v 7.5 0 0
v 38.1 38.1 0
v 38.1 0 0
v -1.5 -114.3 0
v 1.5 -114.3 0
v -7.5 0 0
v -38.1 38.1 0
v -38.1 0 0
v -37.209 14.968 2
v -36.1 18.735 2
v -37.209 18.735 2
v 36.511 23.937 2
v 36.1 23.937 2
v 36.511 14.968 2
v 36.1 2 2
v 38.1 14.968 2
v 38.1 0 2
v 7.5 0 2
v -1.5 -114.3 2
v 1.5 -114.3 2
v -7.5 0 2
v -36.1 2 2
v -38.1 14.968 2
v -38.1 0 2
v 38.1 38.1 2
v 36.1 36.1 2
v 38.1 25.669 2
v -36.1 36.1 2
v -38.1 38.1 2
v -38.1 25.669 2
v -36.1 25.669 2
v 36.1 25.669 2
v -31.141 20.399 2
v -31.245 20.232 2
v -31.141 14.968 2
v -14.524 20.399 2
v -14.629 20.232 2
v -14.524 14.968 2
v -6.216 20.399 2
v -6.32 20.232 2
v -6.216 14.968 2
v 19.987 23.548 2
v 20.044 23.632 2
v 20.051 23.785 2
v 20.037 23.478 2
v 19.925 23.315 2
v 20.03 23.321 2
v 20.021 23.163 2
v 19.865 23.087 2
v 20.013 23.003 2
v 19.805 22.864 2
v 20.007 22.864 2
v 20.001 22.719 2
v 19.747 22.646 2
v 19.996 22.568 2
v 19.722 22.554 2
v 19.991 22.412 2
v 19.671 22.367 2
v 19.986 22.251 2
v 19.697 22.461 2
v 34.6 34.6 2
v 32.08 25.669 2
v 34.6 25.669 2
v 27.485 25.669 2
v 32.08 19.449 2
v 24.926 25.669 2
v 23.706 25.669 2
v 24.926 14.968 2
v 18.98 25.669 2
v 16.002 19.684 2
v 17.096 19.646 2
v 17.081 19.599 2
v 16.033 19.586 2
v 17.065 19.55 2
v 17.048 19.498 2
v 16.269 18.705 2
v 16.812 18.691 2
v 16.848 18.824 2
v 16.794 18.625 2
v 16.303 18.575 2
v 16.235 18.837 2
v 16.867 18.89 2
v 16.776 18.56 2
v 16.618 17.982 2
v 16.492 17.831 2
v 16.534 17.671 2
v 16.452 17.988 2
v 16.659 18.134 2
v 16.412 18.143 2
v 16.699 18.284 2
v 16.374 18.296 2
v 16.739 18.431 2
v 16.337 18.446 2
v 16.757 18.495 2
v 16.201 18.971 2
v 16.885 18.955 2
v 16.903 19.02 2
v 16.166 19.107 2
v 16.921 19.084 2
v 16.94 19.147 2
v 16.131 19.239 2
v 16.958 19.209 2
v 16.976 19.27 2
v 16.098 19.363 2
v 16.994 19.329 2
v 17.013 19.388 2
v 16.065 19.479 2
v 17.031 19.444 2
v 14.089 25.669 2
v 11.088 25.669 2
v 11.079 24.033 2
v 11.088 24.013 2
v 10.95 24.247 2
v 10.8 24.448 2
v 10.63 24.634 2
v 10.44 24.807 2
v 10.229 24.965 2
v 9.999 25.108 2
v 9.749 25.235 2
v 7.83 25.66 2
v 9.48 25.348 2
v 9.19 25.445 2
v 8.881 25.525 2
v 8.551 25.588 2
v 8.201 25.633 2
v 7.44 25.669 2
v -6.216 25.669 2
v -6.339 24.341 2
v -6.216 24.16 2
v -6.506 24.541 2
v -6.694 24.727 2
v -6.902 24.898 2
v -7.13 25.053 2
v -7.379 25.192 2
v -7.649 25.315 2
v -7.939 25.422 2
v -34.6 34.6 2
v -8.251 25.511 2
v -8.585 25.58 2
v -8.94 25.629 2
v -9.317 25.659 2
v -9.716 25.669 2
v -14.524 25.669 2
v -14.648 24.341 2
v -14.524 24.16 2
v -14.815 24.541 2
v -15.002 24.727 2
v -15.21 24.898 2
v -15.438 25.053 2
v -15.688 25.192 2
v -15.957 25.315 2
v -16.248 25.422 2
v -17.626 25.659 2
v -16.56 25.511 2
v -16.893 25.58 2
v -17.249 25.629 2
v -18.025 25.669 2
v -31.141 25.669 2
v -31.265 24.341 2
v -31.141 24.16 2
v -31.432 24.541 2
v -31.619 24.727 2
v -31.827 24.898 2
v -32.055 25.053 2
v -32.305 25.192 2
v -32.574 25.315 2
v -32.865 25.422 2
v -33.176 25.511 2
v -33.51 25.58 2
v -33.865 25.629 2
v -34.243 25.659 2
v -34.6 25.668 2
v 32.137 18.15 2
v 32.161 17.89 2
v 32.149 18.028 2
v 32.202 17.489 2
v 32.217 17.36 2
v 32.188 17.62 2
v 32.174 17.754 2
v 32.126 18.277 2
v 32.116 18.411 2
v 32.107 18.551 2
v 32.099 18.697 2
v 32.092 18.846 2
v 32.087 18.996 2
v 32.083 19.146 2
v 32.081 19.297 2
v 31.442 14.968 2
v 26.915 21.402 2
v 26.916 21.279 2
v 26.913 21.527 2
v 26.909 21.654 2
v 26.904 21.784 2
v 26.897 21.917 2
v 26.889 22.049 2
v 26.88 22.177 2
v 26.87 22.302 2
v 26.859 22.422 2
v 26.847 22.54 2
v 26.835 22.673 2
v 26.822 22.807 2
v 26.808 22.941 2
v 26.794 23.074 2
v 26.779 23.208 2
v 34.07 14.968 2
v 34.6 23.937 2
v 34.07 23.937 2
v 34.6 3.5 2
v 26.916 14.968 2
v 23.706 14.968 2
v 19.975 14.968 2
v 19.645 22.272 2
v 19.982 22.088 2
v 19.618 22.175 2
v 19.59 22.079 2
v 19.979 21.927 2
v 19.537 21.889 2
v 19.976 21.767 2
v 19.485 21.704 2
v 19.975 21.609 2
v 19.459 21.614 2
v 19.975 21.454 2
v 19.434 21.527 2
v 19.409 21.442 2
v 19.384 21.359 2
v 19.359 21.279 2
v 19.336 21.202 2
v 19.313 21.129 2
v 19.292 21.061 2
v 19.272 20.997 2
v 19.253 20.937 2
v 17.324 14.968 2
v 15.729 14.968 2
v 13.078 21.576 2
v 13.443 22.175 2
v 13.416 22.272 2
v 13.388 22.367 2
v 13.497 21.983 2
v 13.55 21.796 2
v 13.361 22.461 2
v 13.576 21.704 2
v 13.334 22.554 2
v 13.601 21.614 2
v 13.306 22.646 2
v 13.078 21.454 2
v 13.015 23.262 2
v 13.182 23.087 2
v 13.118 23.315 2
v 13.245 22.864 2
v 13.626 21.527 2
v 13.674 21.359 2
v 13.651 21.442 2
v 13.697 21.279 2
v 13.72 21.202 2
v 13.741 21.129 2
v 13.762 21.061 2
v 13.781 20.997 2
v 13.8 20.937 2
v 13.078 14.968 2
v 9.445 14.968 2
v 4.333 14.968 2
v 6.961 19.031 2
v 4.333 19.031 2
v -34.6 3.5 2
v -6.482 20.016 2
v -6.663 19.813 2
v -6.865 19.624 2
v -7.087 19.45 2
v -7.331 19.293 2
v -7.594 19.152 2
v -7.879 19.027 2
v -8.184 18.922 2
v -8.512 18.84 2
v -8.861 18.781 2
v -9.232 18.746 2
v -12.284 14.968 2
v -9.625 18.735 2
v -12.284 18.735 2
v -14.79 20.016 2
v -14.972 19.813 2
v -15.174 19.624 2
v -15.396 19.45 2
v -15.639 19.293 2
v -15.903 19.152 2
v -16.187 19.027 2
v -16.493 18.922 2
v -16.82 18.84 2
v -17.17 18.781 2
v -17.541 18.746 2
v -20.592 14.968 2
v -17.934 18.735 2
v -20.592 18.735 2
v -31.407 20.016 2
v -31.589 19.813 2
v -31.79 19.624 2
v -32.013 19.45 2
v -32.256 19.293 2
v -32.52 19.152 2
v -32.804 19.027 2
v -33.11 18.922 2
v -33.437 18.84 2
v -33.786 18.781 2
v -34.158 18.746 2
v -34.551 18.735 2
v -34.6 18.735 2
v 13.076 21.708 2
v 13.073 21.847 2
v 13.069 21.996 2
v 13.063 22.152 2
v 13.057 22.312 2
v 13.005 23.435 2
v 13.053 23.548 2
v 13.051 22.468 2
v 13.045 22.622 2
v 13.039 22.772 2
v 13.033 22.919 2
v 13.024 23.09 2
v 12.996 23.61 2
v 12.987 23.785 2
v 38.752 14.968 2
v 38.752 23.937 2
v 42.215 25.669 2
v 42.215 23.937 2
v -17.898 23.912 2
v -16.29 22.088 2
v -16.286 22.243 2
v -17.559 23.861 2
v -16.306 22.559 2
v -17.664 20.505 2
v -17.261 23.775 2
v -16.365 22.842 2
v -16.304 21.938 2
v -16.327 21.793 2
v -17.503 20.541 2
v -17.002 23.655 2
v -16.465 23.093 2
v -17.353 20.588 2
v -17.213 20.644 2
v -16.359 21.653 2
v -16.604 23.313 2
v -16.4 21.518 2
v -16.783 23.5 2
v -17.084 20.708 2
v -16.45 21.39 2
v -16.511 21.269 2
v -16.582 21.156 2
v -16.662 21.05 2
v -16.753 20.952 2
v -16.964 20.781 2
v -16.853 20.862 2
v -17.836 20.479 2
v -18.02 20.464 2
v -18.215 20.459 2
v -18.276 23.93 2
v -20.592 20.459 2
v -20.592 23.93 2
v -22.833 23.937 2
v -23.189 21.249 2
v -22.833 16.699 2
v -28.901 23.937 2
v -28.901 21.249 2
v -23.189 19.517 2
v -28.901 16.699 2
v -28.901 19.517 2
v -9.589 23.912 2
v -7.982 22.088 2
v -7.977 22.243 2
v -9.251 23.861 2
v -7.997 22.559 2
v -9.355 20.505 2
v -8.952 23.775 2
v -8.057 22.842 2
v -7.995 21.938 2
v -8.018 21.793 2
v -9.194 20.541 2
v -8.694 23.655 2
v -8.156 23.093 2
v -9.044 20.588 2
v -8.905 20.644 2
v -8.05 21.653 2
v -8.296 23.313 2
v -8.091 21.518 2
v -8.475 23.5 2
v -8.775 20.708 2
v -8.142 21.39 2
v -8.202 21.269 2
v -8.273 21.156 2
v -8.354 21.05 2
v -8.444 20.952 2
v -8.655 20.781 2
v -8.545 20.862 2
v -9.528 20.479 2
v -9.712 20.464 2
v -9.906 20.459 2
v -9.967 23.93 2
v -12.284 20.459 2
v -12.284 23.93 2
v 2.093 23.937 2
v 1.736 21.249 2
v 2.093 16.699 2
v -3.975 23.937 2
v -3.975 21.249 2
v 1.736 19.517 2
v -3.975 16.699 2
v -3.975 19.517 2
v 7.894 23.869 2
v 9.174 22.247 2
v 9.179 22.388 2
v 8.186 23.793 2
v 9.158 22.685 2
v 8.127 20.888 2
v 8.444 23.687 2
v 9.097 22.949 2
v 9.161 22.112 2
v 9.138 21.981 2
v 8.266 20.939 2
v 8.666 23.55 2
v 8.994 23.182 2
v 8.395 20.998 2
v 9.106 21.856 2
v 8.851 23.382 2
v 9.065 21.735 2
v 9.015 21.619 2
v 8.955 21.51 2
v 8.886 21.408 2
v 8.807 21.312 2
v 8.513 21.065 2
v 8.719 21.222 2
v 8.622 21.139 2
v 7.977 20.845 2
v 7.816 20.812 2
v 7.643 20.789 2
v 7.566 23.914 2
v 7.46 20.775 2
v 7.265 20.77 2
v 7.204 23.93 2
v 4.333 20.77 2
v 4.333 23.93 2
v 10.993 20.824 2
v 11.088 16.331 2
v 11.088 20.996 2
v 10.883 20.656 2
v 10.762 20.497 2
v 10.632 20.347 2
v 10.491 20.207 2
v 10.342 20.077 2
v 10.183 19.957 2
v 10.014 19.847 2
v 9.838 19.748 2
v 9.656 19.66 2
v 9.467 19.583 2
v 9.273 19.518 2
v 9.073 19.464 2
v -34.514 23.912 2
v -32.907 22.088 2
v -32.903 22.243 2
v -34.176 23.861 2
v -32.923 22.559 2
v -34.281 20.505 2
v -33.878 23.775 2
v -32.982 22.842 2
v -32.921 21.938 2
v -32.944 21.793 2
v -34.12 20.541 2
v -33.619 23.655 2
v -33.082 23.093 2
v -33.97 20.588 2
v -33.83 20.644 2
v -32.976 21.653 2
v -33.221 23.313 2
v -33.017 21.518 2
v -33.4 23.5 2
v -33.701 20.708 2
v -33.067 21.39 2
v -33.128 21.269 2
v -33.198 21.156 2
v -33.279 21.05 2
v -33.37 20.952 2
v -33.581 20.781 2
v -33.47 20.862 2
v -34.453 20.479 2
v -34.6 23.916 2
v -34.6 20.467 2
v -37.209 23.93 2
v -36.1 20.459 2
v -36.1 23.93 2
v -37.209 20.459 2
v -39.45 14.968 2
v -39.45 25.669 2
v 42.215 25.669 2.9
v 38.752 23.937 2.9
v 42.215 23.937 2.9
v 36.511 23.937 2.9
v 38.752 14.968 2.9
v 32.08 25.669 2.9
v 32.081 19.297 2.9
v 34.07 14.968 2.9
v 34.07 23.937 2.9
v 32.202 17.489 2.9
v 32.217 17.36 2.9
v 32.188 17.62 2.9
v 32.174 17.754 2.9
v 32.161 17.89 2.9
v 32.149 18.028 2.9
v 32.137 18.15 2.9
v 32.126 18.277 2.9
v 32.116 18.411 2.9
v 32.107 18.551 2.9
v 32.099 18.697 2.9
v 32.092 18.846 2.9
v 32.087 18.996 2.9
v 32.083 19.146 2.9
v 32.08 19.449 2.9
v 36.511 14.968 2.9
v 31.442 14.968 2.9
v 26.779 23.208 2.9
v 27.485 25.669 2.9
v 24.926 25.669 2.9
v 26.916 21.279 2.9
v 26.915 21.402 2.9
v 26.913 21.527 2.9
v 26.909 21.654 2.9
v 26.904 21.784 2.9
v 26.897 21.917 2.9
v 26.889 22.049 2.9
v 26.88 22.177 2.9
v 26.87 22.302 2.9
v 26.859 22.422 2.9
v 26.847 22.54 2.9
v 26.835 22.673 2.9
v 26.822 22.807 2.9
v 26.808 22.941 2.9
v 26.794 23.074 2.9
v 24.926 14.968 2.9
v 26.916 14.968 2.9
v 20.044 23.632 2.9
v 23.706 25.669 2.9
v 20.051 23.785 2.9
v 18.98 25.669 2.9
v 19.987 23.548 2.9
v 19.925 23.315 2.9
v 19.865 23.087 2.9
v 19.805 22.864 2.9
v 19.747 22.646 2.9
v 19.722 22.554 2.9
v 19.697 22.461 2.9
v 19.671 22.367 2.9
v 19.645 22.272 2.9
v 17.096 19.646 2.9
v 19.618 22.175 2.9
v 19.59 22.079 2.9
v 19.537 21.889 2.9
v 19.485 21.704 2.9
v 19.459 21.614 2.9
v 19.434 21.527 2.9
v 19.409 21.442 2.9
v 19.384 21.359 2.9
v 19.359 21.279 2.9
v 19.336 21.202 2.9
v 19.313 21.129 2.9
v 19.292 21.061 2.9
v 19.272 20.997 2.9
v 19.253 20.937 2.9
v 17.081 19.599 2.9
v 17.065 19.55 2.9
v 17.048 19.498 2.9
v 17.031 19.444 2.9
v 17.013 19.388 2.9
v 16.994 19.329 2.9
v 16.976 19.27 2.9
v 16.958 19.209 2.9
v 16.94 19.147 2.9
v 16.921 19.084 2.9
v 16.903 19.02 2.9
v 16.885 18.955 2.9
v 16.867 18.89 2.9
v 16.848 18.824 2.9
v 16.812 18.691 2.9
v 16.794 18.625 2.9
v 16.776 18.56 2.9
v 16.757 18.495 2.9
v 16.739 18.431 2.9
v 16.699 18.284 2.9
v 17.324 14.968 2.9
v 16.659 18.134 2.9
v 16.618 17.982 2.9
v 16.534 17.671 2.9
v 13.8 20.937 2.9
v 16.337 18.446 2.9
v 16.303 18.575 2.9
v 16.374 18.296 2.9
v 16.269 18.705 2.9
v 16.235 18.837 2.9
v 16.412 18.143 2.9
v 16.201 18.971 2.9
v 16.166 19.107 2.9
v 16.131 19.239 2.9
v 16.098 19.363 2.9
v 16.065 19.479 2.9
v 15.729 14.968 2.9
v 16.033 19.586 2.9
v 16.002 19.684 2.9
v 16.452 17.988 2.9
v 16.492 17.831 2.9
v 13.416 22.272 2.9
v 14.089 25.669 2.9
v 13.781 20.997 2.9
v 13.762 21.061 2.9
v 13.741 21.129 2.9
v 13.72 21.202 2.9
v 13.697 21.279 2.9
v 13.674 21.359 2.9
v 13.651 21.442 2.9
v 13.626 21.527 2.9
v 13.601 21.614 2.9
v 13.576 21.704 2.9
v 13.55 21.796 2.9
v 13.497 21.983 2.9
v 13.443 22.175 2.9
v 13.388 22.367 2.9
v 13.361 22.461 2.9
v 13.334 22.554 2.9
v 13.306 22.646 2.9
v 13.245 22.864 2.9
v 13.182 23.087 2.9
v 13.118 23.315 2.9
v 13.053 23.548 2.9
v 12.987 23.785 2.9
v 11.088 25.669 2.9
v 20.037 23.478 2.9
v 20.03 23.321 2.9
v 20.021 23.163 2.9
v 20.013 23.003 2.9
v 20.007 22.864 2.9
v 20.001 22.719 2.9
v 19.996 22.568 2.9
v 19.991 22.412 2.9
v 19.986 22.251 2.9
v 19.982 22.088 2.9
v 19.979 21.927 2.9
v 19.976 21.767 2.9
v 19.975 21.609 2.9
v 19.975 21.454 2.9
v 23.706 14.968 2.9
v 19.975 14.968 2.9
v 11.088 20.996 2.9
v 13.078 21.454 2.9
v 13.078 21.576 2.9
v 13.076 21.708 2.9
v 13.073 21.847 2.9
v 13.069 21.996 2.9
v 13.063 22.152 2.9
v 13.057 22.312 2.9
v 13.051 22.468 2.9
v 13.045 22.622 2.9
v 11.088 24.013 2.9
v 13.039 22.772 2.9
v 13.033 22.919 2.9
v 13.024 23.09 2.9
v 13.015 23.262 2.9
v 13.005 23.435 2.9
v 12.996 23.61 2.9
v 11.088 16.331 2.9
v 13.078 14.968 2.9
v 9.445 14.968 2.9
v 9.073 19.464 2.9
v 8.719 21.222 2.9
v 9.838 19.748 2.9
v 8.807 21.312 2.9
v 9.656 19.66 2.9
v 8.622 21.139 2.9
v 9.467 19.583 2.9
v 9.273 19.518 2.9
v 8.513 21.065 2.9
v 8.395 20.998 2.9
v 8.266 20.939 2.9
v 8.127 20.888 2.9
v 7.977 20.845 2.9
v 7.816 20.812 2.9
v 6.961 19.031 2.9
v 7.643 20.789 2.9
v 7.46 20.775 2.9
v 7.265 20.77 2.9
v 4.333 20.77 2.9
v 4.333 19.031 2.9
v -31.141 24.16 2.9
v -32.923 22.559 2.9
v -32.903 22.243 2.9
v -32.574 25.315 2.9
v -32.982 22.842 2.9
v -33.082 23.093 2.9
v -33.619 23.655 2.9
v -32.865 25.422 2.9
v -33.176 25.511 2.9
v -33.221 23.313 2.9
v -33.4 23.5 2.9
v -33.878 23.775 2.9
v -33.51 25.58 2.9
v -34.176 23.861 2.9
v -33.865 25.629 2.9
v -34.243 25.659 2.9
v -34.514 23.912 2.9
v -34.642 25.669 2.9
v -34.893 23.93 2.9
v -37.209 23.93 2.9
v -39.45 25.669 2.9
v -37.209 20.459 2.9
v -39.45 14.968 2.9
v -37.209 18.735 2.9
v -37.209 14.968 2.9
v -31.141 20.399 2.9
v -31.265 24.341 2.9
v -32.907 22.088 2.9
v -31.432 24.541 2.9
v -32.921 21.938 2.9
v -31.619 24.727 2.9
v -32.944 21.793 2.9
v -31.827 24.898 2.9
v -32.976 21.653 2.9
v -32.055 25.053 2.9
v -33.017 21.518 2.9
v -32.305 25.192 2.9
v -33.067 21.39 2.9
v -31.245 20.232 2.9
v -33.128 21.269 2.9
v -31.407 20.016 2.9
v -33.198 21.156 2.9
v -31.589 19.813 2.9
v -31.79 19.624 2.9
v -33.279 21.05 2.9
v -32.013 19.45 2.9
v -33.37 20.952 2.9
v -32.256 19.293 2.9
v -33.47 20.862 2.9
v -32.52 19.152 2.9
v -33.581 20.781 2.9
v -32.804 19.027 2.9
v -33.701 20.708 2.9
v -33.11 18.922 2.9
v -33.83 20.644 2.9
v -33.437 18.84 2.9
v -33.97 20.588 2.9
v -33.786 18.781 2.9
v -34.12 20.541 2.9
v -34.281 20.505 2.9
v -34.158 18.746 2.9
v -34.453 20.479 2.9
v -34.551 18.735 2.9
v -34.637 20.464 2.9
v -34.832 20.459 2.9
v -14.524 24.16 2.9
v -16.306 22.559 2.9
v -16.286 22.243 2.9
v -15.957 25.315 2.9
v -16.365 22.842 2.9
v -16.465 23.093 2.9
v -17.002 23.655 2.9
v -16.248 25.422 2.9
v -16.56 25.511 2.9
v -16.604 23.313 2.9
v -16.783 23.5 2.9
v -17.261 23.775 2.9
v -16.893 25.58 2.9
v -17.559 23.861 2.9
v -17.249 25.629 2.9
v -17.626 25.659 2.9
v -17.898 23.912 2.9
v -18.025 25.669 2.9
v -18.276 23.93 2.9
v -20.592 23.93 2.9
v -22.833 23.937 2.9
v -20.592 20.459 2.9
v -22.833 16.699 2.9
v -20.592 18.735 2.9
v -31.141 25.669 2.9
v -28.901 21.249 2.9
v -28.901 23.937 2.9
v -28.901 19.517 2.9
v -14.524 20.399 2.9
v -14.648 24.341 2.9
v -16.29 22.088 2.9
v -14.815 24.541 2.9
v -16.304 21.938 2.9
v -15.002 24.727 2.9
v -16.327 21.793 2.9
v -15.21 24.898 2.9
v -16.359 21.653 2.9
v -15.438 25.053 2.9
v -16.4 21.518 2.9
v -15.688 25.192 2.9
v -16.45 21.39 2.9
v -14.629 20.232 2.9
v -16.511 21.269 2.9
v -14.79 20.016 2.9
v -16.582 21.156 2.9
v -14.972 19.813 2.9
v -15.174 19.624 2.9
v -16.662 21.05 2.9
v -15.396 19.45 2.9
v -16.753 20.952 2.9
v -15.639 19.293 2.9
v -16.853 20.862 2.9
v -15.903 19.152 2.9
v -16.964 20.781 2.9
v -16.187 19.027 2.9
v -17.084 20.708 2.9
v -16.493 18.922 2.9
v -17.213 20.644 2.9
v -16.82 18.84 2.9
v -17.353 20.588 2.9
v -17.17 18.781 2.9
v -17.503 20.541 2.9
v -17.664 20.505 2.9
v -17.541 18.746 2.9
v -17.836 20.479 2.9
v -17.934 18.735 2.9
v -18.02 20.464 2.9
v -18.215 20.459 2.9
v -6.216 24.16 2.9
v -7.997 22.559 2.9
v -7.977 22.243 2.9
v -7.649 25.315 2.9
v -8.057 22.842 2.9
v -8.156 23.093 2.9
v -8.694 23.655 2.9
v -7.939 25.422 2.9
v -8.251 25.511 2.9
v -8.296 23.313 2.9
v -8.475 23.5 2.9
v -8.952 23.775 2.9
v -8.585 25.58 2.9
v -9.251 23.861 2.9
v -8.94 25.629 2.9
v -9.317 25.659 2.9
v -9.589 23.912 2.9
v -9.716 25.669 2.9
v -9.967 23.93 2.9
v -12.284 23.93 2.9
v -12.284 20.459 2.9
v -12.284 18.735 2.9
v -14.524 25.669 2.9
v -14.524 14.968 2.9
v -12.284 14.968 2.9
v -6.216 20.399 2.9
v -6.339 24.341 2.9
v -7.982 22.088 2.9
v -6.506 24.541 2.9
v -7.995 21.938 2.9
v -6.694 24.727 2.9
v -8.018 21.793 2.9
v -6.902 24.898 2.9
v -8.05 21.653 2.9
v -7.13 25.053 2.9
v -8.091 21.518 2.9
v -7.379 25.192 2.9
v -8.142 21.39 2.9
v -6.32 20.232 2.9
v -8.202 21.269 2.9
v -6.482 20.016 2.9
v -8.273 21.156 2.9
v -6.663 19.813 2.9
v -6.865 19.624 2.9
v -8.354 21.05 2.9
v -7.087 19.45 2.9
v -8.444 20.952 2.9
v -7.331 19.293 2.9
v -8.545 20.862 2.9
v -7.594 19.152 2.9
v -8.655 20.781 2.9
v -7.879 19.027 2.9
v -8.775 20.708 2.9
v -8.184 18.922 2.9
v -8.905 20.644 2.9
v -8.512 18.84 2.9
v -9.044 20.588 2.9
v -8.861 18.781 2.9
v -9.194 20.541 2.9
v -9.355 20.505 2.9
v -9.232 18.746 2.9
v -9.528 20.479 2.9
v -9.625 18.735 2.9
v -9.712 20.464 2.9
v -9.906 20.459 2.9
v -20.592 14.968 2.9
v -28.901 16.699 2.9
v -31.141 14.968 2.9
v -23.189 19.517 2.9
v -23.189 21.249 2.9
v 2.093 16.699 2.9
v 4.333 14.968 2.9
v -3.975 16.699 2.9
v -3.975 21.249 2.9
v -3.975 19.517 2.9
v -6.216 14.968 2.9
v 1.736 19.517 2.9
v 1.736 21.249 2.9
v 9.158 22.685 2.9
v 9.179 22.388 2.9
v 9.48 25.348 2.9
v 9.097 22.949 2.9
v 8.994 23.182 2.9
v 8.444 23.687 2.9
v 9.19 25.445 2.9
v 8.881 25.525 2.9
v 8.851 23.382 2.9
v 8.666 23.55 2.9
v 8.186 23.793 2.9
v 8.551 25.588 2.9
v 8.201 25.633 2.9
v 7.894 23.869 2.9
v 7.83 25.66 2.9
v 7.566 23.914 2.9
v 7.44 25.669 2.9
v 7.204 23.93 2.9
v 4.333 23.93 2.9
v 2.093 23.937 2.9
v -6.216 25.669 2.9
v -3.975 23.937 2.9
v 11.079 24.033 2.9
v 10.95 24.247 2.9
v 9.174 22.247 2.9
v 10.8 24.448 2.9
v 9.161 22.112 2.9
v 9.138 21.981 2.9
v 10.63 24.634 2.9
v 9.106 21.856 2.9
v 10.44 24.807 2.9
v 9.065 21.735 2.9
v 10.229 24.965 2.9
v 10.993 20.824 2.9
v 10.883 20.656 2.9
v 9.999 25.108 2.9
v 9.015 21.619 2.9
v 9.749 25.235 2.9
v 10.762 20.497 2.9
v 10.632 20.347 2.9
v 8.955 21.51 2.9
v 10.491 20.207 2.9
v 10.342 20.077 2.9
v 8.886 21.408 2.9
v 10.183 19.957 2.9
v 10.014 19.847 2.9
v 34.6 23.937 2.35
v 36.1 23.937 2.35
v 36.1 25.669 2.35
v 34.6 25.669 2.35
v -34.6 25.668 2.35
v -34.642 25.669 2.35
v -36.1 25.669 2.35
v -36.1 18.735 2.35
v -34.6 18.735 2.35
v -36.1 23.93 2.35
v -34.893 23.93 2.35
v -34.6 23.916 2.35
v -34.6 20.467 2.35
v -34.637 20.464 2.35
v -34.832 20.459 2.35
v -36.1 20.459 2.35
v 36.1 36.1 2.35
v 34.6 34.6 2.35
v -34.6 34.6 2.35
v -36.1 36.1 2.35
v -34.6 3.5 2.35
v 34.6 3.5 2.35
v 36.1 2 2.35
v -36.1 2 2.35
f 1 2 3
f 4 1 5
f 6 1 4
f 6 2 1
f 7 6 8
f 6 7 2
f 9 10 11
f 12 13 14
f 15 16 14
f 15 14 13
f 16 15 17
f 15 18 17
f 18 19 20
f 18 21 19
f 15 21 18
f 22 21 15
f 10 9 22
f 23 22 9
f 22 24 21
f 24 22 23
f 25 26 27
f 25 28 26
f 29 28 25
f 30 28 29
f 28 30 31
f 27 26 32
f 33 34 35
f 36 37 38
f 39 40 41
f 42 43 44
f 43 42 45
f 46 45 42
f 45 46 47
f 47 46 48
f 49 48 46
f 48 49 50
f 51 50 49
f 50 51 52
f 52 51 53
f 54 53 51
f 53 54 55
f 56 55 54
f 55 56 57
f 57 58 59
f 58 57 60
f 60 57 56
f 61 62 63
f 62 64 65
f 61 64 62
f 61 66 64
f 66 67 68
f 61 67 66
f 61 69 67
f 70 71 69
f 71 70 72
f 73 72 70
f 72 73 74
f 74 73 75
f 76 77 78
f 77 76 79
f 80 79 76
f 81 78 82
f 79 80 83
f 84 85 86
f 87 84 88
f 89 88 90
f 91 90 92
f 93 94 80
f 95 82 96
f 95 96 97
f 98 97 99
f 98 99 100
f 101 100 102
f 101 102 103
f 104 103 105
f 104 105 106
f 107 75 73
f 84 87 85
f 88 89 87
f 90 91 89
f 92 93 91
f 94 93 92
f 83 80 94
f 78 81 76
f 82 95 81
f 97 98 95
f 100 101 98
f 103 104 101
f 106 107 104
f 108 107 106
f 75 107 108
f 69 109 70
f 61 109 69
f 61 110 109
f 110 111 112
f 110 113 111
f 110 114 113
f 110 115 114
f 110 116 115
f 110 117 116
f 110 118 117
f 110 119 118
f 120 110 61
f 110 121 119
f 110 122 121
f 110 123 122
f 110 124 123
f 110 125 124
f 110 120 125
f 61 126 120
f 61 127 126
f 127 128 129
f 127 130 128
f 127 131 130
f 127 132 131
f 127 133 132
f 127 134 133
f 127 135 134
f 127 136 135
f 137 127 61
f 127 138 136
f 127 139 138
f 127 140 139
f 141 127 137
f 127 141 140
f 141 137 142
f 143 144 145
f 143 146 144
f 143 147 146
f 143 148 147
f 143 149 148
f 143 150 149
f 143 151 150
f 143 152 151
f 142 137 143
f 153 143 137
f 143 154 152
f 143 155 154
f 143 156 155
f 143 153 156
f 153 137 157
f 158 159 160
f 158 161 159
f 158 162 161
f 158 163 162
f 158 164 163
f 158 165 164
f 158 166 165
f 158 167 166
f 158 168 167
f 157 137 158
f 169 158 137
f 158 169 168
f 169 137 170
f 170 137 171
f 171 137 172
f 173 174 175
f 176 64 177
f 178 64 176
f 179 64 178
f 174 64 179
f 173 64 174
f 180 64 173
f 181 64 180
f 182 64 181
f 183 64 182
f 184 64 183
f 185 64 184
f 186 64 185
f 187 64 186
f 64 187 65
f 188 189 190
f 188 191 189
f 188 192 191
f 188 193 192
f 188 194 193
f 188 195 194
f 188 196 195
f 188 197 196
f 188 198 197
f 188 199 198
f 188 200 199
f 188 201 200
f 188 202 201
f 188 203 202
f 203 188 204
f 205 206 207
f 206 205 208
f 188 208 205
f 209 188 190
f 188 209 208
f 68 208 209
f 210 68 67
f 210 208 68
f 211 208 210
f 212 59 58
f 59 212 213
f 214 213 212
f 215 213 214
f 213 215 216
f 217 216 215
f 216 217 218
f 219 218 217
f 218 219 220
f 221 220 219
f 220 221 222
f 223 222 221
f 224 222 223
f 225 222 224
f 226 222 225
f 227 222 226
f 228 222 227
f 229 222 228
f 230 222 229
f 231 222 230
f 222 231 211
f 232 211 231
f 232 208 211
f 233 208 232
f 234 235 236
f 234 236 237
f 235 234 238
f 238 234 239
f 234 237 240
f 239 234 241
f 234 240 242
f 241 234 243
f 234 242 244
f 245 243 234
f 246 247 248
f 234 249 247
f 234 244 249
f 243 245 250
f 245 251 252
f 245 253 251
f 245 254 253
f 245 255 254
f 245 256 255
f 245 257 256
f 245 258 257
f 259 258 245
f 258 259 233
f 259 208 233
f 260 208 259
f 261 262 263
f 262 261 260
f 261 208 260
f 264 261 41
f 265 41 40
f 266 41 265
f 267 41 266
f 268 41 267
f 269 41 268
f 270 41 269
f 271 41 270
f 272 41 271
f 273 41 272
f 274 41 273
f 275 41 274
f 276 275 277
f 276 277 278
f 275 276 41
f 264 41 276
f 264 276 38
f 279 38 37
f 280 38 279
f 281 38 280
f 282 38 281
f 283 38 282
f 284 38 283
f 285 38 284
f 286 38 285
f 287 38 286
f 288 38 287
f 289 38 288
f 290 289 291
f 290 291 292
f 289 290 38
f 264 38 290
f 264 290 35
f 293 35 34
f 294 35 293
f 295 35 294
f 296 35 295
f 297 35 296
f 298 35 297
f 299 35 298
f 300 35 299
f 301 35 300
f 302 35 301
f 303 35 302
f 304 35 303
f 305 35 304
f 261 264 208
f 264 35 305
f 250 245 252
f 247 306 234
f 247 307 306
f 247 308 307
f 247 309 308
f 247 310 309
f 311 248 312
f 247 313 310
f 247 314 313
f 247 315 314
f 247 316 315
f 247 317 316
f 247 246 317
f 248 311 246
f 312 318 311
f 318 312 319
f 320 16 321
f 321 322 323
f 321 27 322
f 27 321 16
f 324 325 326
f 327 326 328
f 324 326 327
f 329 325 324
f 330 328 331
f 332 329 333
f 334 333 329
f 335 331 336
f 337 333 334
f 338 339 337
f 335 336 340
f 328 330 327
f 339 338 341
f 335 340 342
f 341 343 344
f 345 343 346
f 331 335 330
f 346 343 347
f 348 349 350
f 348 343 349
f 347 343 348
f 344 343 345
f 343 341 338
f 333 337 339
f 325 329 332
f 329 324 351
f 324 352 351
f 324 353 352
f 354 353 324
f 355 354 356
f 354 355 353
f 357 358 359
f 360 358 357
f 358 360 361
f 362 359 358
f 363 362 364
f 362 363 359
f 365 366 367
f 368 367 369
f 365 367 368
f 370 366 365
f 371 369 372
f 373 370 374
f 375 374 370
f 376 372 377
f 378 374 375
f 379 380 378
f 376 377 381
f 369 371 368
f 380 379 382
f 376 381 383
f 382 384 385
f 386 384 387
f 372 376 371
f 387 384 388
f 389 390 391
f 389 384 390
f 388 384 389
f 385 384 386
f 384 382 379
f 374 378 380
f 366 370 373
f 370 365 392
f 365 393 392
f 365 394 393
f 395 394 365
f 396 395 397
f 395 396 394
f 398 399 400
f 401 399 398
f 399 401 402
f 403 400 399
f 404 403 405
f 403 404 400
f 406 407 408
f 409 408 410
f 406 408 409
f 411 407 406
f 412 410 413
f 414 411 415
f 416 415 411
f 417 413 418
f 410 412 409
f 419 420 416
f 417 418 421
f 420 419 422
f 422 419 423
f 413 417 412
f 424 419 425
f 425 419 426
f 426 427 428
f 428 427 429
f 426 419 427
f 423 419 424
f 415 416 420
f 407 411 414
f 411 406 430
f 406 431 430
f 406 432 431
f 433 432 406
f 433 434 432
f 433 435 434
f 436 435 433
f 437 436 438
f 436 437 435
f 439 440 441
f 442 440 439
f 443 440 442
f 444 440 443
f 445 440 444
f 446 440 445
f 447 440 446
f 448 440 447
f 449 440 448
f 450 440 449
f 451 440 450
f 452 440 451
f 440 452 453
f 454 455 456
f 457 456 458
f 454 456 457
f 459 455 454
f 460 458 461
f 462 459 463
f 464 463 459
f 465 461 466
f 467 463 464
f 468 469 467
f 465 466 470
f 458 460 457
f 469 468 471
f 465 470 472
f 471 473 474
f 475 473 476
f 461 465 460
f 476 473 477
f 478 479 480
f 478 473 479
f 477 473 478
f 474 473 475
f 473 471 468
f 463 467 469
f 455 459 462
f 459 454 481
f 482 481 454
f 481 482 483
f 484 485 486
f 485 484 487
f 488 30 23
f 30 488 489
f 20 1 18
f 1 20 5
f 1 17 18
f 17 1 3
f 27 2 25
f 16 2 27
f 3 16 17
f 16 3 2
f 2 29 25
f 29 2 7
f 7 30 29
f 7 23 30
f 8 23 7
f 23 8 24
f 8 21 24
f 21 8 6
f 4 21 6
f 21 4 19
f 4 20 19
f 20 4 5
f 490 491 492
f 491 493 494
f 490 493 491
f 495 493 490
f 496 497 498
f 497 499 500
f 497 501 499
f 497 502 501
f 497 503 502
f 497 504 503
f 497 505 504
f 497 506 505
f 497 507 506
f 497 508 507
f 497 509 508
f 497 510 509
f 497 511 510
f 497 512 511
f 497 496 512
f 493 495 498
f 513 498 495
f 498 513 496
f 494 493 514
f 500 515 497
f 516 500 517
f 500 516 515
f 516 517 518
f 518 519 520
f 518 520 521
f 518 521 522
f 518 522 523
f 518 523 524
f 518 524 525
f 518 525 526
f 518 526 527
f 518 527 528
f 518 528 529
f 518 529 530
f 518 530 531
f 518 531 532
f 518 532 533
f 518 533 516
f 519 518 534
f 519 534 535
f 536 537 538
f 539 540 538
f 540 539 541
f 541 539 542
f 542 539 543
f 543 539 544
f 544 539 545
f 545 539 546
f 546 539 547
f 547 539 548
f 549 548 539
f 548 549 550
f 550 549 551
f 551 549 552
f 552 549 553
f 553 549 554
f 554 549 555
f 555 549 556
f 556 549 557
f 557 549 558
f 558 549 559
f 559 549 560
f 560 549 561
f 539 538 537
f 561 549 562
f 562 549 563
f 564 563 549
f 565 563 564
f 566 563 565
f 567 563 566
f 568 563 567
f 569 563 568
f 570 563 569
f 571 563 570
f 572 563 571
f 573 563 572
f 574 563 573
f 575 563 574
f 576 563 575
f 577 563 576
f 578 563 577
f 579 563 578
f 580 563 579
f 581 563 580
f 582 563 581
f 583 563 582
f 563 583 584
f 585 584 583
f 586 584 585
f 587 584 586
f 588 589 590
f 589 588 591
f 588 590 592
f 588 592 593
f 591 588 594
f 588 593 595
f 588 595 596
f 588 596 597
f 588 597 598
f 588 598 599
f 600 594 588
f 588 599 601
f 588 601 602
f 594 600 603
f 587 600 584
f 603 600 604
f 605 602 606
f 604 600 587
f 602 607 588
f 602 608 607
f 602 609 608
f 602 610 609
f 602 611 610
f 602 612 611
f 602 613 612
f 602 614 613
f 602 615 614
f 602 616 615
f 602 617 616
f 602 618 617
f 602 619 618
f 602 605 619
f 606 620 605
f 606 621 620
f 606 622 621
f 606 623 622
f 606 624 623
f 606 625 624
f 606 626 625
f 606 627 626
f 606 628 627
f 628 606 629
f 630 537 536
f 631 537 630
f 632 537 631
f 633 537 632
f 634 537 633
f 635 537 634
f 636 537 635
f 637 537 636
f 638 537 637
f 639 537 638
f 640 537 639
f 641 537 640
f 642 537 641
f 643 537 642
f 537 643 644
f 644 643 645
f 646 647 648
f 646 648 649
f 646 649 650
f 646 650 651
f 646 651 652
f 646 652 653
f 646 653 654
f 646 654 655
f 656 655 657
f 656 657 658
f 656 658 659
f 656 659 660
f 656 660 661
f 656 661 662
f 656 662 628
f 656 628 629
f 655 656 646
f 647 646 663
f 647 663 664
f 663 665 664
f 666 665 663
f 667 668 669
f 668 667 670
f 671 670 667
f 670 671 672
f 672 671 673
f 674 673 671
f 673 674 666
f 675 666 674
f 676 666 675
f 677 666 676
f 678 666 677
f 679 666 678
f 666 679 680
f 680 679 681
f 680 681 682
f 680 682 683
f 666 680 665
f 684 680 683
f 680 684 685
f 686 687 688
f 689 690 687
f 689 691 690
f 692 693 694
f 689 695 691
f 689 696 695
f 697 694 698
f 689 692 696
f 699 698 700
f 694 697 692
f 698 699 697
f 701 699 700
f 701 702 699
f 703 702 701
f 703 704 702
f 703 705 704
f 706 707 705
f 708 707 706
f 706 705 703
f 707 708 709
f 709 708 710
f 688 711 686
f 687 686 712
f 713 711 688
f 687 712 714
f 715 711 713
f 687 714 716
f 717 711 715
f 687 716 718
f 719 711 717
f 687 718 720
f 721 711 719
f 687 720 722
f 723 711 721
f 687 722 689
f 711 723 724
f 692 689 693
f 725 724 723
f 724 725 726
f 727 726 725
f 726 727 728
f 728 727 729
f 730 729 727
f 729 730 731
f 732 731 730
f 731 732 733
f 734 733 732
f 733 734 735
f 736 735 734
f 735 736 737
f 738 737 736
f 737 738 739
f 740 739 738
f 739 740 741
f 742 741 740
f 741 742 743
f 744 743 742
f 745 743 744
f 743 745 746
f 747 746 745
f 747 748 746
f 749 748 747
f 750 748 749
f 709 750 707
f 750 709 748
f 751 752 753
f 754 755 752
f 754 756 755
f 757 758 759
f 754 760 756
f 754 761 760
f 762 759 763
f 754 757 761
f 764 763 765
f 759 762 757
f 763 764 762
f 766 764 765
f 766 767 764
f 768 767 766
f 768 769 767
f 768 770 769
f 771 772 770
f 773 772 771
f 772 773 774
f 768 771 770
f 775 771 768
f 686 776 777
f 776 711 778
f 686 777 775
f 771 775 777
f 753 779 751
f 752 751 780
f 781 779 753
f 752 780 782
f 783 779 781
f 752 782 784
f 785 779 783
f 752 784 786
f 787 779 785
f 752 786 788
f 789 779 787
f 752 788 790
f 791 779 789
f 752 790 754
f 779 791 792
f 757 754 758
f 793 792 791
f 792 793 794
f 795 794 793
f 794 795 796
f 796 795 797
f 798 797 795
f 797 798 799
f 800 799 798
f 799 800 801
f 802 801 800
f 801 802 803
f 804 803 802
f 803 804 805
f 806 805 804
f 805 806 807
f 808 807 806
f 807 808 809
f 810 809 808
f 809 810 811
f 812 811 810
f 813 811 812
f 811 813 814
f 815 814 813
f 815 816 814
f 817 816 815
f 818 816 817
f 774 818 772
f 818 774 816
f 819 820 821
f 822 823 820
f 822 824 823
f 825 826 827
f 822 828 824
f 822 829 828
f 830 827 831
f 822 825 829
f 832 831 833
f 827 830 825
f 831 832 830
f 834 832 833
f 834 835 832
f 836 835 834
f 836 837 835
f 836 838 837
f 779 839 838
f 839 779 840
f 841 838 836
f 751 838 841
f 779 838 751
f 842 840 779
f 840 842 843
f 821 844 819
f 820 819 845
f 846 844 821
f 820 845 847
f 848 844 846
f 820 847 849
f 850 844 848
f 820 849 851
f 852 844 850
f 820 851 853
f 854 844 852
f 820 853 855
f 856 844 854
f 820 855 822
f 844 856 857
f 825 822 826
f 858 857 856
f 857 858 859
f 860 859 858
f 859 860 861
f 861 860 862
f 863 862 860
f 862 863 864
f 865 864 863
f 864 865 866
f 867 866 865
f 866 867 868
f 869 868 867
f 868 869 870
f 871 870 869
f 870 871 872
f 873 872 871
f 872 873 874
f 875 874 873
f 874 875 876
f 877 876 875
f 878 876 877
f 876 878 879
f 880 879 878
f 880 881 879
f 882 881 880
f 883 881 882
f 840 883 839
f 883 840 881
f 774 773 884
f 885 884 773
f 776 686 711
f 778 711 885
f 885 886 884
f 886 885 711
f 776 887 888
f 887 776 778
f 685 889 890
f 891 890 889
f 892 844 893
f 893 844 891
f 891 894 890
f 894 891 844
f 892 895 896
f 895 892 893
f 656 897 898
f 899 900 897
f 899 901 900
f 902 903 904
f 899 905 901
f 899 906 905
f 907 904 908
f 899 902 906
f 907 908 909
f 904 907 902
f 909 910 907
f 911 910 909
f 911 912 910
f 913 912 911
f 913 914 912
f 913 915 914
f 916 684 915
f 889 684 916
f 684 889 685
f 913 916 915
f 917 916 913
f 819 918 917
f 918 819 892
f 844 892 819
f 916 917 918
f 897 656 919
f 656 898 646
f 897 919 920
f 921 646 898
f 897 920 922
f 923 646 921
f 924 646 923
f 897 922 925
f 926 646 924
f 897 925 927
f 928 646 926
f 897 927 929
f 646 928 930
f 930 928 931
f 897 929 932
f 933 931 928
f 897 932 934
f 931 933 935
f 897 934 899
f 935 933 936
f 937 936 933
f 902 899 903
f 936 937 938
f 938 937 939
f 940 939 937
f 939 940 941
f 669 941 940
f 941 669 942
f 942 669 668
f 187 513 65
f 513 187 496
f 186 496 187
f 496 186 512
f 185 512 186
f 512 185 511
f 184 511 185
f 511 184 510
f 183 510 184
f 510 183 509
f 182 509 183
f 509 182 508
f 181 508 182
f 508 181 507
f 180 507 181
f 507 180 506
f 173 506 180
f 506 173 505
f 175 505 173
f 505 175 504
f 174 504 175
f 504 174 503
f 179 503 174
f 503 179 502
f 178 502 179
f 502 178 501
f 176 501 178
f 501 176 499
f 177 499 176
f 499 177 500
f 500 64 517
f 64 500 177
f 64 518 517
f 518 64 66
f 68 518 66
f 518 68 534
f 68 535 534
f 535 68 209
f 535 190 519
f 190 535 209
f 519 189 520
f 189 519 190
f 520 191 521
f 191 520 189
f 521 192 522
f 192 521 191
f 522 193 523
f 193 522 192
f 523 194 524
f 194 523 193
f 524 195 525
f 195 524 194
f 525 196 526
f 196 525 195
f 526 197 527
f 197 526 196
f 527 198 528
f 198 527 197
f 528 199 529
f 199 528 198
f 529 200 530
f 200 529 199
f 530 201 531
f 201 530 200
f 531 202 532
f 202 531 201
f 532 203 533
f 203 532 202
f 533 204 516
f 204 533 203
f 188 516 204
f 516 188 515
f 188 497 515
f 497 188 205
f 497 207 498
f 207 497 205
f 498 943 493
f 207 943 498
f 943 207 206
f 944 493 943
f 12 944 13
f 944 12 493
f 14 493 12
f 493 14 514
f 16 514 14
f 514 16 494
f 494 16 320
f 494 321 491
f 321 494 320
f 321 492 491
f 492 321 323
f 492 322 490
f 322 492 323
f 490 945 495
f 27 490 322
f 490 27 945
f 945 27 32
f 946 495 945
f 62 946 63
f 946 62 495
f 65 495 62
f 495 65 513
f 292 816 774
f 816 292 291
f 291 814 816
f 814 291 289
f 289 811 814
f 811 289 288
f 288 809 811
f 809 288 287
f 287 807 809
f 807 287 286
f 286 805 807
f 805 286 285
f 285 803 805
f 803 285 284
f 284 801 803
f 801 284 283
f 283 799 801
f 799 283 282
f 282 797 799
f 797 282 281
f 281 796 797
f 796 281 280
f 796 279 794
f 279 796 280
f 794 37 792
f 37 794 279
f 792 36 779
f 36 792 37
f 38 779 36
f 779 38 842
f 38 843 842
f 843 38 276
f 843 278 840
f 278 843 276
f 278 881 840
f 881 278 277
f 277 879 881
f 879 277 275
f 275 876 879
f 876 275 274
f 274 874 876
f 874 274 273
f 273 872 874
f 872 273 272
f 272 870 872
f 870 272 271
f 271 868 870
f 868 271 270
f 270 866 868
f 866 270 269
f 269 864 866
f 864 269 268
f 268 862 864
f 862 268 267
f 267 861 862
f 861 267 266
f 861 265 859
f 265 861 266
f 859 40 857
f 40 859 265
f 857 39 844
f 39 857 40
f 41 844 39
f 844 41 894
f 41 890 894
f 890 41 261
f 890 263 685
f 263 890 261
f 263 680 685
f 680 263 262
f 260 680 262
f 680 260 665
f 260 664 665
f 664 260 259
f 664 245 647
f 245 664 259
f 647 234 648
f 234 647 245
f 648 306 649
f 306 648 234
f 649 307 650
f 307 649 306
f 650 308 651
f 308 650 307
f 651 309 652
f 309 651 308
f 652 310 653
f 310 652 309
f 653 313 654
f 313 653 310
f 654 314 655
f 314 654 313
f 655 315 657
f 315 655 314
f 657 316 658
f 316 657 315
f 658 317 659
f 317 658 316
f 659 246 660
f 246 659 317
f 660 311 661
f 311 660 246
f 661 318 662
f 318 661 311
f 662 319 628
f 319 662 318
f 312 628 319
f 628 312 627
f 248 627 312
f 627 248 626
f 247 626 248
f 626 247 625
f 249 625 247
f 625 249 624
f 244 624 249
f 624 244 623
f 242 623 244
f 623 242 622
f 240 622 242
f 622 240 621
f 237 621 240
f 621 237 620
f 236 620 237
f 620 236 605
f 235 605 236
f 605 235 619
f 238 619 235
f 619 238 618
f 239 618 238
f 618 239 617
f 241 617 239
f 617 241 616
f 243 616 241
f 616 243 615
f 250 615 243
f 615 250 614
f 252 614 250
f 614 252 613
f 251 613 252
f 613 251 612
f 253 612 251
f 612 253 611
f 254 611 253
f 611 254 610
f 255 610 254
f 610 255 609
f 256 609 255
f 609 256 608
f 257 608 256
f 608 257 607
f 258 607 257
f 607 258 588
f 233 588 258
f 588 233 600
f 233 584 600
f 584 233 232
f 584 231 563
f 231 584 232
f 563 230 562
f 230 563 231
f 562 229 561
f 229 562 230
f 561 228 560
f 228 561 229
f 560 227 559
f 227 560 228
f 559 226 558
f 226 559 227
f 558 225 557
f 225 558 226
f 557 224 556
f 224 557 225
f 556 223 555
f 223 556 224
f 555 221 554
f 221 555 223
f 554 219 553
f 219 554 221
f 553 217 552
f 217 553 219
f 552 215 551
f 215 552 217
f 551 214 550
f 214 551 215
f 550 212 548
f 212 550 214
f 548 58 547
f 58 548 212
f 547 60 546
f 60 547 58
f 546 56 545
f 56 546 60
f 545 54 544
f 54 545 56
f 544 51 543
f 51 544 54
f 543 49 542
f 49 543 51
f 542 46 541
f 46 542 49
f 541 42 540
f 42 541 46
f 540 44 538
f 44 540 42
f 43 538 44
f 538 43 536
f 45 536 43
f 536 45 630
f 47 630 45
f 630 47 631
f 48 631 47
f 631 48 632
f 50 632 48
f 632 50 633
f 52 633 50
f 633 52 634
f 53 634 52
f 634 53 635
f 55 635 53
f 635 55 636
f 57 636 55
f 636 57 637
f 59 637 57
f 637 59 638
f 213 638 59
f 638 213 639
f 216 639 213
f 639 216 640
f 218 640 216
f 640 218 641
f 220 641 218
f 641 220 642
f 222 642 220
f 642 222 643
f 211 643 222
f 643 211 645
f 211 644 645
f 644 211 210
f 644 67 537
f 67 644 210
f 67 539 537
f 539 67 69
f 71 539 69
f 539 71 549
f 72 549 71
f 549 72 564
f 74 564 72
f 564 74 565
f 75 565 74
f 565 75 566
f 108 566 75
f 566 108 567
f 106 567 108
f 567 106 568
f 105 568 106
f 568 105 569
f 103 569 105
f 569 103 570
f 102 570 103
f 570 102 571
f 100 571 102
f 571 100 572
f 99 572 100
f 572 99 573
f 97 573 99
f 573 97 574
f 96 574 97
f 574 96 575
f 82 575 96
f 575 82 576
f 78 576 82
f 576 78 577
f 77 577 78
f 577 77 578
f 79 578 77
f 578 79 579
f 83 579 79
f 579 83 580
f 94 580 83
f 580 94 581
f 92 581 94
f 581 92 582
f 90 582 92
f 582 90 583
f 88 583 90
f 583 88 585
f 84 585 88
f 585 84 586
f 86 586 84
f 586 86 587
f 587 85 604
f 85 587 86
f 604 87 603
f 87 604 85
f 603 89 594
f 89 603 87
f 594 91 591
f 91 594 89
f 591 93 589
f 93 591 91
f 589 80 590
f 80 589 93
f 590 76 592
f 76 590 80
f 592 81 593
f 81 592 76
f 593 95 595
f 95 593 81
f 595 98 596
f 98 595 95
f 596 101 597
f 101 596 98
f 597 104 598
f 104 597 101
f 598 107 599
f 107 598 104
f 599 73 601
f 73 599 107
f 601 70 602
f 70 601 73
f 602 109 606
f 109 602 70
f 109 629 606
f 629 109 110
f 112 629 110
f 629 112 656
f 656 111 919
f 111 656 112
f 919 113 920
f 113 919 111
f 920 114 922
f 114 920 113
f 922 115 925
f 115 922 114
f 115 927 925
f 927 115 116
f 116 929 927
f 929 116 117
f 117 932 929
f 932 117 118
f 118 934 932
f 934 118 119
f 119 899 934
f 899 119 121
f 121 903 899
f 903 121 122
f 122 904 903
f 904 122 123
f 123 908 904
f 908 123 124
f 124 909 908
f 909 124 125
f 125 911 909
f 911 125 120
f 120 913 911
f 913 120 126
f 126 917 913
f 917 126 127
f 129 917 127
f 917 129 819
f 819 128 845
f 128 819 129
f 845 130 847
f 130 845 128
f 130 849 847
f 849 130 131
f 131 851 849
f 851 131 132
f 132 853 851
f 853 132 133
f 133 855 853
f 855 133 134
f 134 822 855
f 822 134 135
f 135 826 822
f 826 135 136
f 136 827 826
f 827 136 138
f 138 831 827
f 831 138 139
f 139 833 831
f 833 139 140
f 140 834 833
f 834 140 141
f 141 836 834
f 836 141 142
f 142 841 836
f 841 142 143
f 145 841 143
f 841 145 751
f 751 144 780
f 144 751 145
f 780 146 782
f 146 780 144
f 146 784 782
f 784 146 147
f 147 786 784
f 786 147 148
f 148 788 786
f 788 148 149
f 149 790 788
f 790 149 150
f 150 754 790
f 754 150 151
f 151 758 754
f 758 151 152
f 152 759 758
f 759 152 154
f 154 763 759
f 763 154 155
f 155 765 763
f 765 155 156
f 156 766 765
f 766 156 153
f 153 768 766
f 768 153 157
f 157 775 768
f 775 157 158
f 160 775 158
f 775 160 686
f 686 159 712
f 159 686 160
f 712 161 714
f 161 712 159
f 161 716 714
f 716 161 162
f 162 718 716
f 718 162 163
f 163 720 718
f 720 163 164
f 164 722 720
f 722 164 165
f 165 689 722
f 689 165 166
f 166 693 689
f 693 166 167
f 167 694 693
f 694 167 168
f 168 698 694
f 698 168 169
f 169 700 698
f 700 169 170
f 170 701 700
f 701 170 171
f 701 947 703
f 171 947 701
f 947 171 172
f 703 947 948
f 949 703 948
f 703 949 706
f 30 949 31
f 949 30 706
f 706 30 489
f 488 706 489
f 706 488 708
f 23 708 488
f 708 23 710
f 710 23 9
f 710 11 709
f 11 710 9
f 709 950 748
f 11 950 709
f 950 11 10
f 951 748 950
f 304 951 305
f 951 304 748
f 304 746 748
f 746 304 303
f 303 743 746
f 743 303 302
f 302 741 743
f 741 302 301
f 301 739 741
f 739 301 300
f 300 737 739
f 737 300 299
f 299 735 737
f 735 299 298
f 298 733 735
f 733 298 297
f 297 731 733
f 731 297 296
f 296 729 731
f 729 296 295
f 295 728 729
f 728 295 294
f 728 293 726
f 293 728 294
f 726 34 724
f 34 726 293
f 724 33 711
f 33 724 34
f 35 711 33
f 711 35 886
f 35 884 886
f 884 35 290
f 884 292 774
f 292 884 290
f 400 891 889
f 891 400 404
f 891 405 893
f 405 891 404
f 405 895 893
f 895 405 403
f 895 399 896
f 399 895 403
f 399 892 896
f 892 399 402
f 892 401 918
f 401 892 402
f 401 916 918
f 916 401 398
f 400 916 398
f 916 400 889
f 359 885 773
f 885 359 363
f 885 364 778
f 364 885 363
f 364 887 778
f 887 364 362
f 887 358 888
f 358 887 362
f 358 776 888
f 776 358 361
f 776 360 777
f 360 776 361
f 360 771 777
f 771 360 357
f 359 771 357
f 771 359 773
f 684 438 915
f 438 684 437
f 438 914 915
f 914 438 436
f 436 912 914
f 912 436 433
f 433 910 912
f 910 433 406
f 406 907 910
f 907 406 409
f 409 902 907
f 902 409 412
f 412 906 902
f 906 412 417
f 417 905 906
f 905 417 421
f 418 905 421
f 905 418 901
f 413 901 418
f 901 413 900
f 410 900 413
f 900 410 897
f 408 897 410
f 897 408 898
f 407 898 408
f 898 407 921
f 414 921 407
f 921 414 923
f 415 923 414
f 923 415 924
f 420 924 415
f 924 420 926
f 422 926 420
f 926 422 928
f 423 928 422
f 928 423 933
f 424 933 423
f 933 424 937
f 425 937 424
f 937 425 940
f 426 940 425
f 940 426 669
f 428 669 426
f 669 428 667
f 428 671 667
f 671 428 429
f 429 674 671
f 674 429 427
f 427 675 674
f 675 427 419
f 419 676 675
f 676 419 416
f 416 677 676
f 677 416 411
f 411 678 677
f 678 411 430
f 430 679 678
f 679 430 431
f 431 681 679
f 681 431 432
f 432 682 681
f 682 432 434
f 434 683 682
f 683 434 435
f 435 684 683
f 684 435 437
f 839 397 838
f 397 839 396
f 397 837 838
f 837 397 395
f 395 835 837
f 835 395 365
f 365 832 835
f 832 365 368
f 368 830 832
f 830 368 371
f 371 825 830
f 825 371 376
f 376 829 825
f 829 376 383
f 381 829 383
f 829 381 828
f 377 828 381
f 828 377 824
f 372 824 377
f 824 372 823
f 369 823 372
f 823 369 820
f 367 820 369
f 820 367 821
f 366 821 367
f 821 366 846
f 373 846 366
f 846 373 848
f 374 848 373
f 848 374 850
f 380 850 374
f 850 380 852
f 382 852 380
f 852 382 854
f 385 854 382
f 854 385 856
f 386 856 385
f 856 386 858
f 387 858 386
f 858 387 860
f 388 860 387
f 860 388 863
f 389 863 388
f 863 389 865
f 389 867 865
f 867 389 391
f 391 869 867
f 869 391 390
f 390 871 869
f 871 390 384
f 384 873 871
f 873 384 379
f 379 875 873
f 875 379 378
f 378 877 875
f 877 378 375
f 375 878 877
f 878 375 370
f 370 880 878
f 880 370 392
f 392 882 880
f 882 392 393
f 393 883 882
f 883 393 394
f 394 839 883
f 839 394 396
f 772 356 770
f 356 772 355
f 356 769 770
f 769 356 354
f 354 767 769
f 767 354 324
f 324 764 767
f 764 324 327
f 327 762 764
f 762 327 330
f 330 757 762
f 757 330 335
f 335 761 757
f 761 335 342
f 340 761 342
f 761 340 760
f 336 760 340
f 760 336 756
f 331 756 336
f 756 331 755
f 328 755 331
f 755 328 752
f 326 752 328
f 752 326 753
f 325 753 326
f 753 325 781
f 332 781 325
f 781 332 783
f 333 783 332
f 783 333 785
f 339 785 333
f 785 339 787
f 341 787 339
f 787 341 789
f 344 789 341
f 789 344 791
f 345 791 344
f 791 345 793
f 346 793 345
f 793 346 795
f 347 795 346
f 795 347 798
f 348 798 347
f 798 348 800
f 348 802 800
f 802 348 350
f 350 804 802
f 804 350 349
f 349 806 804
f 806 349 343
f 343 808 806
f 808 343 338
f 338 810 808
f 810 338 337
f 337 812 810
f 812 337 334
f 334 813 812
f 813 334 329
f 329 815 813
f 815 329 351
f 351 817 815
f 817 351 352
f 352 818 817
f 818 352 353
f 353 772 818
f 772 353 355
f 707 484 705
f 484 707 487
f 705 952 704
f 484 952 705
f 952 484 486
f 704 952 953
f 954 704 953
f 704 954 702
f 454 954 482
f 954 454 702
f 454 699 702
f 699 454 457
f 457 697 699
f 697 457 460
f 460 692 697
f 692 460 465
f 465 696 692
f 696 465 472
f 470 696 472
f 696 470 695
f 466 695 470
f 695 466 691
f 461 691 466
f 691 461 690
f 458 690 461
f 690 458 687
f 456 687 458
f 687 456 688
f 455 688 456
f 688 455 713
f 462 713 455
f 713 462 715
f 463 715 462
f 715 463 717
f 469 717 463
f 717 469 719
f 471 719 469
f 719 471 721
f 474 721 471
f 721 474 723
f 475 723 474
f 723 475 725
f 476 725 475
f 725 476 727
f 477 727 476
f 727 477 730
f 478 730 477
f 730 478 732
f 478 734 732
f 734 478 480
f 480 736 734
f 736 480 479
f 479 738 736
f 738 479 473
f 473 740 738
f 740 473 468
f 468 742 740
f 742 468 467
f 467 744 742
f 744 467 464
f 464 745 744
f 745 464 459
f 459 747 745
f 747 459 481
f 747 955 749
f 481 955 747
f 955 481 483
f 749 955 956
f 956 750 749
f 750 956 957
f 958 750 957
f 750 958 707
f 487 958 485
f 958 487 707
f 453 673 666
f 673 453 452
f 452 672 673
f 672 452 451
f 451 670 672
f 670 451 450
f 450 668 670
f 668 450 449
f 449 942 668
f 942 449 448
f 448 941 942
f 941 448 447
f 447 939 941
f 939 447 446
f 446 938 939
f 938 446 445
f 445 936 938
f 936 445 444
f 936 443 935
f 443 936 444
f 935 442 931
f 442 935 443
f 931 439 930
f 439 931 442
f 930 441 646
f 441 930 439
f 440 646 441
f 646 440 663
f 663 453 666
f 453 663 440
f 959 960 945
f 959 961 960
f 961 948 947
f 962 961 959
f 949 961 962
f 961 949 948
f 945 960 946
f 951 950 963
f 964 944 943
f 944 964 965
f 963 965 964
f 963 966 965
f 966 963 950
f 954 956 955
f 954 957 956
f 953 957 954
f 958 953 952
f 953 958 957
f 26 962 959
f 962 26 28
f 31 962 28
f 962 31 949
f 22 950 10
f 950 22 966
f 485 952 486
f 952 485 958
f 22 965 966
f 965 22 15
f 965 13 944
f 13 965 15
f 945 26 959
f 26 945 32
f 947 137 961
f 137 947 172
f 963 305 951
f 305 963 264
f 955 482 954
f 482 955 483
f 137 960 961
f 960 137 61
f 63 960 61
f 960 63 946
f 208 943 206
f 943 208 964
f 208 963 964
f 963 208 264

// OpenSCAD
// Parametric garden plant marker for FlashForge Adventurer 5M Pro.
// Units are millimeters.

$fn = 36;

label = "PEPPERMINT";
tag_w = 76.2;       // 3 in
tag_h = 38.1;       // 1.5 in
spike_l = 114.3;    // 4.5 in
spike_top_w = 15;
spike_tip_w = 3;
base_z = 2.0;
text_z = 0.9;

module marker_2d() {
  union() {
    translate([-tag_w / 2, 0])
      square([tag_w, tag_h]);
    polygon([
      [-spike_top_w / 2, 0],
      [ spike_top_w / 2, 0],
      [ spike_tip_w / 2, -spike_l],
      [-spike_tip_w / 2, -spike_l]
    ]);
  }
}

module raised_text() {
  translate([0, tag_h * 0.53, base_z])
    linear_extrude(height = text_z)
      text(
        label,
        size = 11.2,
        font = "Liberation Sans:style=Bold",
        halign = "center",
        valign = "center",
        spacing = 0.82
      );
}

module top_rim() {
  translate([0, tag_h / 2, base_z])
    linear_extrude(height = 0.35)
      difference() {
        square([tag_w - 4, tag_h - 4], center = true);
        square([tag_w - 7, tag_h - 7], center = true);
      }
}

linear_extrude(height = base_z)
  marker_2d();

raised_text();
top_rim();
